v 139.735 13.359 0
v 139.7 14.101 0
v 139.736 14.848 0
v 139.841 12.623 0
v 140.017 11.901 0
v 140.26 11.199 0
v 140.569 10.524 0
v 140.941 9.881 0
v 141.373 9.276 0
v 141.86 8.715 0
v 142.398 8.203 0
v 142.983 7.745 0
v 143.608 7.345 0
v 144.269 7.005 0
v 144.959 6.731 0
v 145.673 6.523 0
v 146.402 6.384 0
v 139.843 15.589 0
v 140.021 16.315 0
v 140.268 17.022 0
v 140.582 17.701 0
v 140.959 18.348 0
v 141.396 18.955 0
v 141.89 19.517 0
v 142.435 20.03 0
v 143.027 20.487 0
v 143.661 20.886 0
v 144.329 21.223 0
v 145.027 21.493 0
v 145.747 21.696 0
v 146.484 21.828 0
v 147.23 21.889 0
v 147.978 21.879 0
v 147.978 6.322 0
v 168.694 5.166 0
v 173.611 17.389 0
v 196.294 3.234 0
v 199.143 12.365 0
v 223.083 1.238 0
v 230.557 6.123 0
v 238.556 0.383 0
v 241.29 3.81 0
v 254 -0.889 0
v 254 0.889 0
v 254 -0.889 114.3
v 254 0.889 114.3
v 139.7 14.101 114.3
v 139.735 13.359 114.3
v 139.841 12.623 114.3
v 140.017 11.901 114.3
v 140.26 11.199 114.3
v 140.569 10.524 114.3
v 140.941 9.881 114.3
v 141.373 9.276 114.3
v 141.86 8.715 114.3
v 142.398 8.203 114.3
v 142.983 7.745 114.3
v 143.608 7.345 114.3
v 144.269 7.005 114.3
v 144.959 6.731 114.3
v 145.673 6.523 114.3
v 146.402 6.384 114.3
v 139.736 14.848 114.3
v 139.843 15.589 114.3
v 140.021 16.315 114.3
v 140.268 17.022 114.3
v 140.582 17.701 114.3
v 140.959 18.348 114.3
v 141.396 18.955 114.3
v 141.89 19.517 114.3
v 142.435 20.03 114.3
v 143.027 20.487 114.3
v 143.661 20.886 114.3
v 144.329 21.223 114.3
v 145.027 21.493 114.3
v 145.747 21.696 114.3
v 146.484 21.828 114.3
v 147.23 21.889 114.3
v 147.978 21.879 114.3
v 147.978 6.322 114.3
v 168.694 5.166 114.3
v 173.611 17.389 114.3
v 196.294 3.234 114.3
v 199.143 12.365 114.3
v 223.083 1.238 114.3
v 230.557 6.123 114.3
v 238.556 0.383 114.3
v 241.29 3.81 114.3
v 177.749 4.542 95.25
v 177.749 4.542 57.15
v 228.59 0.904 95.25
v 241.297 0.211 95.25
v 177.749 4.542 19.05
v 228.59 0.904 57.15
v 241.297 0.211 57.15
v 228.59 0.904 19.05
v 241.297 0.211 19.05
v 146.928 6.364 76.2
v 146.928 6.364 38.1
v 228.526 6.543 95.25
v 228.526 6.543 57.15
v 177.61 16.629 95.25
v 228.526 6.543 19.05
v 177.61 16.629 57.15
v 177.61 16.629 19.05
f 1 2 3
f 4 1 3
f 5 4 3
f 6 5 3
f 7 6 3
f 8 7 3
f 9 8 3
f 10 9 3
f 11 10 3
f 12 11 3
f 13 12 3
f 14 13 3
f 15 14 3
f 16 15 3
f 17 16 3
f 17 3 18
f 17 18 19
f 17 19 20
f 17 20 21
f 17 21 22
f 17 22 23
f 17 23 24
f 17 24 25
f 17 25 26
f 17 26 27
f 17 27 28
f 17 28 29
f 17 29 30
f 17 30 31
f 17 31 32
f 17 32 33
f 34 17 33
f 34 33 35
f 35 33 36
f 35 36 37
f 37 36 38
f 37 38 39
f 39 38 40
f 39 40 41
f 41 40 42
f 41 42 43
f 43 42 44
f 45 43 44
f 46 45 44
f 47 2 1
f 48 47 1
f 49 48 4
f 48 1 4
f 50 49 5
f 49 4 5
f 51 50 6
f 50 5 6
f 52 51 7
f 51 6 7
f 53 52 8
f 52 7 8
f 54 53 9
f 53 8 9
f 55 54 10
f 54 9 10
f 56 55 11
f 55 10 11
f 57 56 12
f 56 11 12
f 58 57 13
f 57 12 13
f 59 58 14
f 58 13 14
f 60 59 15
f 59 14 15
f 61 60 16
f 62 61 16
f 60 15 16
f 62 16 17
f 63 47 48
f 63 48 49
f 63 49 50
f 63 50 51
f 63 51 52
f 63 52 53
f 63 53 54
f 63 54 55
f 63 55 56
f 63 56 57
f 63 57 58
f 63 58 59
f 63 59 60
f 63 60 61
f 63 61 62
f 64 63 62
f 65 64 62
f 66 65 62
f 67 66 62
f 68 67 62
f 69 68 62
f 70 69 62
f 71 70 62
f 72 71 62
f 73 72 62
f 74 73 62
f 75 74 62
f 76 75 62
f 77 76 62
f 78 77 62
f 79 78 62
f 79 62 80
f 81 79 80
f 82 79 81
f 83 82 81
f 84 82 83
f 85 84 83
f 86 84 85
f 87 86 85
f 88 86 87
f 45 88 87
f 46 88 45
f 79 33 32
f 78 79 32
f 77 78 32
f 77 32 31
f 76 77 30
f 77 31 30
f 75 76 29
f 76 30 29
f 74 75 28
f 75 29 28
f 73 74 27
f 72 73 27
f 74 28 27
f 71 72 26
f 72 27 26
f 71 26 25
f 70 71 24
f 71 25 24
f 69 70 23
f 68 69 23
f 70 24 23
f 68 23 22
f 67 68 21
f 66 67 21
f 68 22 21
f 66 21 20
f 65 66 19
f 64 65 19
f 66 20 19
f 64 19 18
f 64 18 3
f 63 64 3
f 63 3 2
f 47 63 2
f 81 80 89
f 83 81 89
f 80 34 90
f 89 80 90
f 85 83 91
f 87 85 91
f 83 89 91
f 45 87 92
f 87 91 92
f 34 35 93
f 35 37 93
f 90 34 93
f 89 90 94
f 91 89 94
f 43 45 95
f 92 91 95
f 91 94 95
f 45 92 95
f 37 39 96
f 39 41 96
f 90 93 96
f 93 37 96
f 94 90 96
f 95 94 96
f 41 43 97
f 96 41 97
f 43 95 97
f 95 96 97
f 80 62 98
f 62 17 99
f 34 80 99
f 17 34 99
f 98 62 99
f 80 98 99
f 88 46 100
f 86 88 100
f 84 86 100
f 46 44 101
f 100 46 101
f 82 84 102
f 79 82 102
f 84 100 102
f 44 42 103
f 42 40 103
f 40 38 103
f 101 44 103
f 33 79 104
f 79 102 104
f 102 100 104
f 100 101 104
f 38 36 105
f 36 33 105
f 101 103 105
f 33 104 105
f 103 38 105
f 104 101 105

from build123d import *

# Parameters (mm, degrees)
BOSS_EXTRUDE1_DEPTH = 114.3


with BuildPart() as part:
    # Sketch1 → Boss-Extrude1 (new body)
    with BuildSketch(Plane.XY):
        with BuildLine():
            Line((254, -0.889), (254, 0.889))
            add(Edge.make_bspline(
                [(254, 0.889), (249.755300971, 1.878593359), (241.284220881, 3.853509493), (224.315824879, 7.473607963), (203.056452147, 11.527247876), (177.661285298, 16.728315171), (159.271445788, 20.022431729), (149.372045682, 21.653055355), (147.97786, 21.878845413)],
                knots=[0, 0, 0, 0, 0.025044993, 0.049981904, 0.099692877, 0.149404795, 0.198930977, 0.207045259, 0.207045259, 0.207045259, 0.207045259], degree=3))
            ThreePointArc((147.97786, 21.878845413), (142.156665485, 19.779994096), (139.7, 14.100533107))
            ThreePointArc((139.7, 14.100533107), (141.60956807, 8.989999859), (146.402491493, 6.383875276))
            add(Edge.make_bspline(
                [(146.402491493, 6.383875276), (146.927641819, 6.363923621), (147.452765169, 6.343386084), (147.97786, 6.3222208)],
                knots=[0.793421305, 0.793421305, 0.793421305, 0.793421305, 0.796441456, 0.796441456, 0.796441456, 0.796441456], degree=3))
            add(Edge.make_bspline(
                [(147.97786, 6.3222208), (149.428428511, 6.263751943), (159.359633347, 5.830586303), (177.755025487, 4.534004477), (203.173260157, 2.785083613), (224.33530321, 1.016787469), (241.313406146, 0.326551109), (249.768531374, -0.483566797), (254, -0.889)],
                knots=[0.796441456, 0.796441456, 0.796441456, 0.796441456, 0.804784589, 0.853570641, 0.902385984, 0.951201328, 0.97557812, 1, 1, 1, 1], degree=3))
        make_face()
    extrude(amount=BOSS_EXTRUDE1_DEPTH)


solid = part.part
